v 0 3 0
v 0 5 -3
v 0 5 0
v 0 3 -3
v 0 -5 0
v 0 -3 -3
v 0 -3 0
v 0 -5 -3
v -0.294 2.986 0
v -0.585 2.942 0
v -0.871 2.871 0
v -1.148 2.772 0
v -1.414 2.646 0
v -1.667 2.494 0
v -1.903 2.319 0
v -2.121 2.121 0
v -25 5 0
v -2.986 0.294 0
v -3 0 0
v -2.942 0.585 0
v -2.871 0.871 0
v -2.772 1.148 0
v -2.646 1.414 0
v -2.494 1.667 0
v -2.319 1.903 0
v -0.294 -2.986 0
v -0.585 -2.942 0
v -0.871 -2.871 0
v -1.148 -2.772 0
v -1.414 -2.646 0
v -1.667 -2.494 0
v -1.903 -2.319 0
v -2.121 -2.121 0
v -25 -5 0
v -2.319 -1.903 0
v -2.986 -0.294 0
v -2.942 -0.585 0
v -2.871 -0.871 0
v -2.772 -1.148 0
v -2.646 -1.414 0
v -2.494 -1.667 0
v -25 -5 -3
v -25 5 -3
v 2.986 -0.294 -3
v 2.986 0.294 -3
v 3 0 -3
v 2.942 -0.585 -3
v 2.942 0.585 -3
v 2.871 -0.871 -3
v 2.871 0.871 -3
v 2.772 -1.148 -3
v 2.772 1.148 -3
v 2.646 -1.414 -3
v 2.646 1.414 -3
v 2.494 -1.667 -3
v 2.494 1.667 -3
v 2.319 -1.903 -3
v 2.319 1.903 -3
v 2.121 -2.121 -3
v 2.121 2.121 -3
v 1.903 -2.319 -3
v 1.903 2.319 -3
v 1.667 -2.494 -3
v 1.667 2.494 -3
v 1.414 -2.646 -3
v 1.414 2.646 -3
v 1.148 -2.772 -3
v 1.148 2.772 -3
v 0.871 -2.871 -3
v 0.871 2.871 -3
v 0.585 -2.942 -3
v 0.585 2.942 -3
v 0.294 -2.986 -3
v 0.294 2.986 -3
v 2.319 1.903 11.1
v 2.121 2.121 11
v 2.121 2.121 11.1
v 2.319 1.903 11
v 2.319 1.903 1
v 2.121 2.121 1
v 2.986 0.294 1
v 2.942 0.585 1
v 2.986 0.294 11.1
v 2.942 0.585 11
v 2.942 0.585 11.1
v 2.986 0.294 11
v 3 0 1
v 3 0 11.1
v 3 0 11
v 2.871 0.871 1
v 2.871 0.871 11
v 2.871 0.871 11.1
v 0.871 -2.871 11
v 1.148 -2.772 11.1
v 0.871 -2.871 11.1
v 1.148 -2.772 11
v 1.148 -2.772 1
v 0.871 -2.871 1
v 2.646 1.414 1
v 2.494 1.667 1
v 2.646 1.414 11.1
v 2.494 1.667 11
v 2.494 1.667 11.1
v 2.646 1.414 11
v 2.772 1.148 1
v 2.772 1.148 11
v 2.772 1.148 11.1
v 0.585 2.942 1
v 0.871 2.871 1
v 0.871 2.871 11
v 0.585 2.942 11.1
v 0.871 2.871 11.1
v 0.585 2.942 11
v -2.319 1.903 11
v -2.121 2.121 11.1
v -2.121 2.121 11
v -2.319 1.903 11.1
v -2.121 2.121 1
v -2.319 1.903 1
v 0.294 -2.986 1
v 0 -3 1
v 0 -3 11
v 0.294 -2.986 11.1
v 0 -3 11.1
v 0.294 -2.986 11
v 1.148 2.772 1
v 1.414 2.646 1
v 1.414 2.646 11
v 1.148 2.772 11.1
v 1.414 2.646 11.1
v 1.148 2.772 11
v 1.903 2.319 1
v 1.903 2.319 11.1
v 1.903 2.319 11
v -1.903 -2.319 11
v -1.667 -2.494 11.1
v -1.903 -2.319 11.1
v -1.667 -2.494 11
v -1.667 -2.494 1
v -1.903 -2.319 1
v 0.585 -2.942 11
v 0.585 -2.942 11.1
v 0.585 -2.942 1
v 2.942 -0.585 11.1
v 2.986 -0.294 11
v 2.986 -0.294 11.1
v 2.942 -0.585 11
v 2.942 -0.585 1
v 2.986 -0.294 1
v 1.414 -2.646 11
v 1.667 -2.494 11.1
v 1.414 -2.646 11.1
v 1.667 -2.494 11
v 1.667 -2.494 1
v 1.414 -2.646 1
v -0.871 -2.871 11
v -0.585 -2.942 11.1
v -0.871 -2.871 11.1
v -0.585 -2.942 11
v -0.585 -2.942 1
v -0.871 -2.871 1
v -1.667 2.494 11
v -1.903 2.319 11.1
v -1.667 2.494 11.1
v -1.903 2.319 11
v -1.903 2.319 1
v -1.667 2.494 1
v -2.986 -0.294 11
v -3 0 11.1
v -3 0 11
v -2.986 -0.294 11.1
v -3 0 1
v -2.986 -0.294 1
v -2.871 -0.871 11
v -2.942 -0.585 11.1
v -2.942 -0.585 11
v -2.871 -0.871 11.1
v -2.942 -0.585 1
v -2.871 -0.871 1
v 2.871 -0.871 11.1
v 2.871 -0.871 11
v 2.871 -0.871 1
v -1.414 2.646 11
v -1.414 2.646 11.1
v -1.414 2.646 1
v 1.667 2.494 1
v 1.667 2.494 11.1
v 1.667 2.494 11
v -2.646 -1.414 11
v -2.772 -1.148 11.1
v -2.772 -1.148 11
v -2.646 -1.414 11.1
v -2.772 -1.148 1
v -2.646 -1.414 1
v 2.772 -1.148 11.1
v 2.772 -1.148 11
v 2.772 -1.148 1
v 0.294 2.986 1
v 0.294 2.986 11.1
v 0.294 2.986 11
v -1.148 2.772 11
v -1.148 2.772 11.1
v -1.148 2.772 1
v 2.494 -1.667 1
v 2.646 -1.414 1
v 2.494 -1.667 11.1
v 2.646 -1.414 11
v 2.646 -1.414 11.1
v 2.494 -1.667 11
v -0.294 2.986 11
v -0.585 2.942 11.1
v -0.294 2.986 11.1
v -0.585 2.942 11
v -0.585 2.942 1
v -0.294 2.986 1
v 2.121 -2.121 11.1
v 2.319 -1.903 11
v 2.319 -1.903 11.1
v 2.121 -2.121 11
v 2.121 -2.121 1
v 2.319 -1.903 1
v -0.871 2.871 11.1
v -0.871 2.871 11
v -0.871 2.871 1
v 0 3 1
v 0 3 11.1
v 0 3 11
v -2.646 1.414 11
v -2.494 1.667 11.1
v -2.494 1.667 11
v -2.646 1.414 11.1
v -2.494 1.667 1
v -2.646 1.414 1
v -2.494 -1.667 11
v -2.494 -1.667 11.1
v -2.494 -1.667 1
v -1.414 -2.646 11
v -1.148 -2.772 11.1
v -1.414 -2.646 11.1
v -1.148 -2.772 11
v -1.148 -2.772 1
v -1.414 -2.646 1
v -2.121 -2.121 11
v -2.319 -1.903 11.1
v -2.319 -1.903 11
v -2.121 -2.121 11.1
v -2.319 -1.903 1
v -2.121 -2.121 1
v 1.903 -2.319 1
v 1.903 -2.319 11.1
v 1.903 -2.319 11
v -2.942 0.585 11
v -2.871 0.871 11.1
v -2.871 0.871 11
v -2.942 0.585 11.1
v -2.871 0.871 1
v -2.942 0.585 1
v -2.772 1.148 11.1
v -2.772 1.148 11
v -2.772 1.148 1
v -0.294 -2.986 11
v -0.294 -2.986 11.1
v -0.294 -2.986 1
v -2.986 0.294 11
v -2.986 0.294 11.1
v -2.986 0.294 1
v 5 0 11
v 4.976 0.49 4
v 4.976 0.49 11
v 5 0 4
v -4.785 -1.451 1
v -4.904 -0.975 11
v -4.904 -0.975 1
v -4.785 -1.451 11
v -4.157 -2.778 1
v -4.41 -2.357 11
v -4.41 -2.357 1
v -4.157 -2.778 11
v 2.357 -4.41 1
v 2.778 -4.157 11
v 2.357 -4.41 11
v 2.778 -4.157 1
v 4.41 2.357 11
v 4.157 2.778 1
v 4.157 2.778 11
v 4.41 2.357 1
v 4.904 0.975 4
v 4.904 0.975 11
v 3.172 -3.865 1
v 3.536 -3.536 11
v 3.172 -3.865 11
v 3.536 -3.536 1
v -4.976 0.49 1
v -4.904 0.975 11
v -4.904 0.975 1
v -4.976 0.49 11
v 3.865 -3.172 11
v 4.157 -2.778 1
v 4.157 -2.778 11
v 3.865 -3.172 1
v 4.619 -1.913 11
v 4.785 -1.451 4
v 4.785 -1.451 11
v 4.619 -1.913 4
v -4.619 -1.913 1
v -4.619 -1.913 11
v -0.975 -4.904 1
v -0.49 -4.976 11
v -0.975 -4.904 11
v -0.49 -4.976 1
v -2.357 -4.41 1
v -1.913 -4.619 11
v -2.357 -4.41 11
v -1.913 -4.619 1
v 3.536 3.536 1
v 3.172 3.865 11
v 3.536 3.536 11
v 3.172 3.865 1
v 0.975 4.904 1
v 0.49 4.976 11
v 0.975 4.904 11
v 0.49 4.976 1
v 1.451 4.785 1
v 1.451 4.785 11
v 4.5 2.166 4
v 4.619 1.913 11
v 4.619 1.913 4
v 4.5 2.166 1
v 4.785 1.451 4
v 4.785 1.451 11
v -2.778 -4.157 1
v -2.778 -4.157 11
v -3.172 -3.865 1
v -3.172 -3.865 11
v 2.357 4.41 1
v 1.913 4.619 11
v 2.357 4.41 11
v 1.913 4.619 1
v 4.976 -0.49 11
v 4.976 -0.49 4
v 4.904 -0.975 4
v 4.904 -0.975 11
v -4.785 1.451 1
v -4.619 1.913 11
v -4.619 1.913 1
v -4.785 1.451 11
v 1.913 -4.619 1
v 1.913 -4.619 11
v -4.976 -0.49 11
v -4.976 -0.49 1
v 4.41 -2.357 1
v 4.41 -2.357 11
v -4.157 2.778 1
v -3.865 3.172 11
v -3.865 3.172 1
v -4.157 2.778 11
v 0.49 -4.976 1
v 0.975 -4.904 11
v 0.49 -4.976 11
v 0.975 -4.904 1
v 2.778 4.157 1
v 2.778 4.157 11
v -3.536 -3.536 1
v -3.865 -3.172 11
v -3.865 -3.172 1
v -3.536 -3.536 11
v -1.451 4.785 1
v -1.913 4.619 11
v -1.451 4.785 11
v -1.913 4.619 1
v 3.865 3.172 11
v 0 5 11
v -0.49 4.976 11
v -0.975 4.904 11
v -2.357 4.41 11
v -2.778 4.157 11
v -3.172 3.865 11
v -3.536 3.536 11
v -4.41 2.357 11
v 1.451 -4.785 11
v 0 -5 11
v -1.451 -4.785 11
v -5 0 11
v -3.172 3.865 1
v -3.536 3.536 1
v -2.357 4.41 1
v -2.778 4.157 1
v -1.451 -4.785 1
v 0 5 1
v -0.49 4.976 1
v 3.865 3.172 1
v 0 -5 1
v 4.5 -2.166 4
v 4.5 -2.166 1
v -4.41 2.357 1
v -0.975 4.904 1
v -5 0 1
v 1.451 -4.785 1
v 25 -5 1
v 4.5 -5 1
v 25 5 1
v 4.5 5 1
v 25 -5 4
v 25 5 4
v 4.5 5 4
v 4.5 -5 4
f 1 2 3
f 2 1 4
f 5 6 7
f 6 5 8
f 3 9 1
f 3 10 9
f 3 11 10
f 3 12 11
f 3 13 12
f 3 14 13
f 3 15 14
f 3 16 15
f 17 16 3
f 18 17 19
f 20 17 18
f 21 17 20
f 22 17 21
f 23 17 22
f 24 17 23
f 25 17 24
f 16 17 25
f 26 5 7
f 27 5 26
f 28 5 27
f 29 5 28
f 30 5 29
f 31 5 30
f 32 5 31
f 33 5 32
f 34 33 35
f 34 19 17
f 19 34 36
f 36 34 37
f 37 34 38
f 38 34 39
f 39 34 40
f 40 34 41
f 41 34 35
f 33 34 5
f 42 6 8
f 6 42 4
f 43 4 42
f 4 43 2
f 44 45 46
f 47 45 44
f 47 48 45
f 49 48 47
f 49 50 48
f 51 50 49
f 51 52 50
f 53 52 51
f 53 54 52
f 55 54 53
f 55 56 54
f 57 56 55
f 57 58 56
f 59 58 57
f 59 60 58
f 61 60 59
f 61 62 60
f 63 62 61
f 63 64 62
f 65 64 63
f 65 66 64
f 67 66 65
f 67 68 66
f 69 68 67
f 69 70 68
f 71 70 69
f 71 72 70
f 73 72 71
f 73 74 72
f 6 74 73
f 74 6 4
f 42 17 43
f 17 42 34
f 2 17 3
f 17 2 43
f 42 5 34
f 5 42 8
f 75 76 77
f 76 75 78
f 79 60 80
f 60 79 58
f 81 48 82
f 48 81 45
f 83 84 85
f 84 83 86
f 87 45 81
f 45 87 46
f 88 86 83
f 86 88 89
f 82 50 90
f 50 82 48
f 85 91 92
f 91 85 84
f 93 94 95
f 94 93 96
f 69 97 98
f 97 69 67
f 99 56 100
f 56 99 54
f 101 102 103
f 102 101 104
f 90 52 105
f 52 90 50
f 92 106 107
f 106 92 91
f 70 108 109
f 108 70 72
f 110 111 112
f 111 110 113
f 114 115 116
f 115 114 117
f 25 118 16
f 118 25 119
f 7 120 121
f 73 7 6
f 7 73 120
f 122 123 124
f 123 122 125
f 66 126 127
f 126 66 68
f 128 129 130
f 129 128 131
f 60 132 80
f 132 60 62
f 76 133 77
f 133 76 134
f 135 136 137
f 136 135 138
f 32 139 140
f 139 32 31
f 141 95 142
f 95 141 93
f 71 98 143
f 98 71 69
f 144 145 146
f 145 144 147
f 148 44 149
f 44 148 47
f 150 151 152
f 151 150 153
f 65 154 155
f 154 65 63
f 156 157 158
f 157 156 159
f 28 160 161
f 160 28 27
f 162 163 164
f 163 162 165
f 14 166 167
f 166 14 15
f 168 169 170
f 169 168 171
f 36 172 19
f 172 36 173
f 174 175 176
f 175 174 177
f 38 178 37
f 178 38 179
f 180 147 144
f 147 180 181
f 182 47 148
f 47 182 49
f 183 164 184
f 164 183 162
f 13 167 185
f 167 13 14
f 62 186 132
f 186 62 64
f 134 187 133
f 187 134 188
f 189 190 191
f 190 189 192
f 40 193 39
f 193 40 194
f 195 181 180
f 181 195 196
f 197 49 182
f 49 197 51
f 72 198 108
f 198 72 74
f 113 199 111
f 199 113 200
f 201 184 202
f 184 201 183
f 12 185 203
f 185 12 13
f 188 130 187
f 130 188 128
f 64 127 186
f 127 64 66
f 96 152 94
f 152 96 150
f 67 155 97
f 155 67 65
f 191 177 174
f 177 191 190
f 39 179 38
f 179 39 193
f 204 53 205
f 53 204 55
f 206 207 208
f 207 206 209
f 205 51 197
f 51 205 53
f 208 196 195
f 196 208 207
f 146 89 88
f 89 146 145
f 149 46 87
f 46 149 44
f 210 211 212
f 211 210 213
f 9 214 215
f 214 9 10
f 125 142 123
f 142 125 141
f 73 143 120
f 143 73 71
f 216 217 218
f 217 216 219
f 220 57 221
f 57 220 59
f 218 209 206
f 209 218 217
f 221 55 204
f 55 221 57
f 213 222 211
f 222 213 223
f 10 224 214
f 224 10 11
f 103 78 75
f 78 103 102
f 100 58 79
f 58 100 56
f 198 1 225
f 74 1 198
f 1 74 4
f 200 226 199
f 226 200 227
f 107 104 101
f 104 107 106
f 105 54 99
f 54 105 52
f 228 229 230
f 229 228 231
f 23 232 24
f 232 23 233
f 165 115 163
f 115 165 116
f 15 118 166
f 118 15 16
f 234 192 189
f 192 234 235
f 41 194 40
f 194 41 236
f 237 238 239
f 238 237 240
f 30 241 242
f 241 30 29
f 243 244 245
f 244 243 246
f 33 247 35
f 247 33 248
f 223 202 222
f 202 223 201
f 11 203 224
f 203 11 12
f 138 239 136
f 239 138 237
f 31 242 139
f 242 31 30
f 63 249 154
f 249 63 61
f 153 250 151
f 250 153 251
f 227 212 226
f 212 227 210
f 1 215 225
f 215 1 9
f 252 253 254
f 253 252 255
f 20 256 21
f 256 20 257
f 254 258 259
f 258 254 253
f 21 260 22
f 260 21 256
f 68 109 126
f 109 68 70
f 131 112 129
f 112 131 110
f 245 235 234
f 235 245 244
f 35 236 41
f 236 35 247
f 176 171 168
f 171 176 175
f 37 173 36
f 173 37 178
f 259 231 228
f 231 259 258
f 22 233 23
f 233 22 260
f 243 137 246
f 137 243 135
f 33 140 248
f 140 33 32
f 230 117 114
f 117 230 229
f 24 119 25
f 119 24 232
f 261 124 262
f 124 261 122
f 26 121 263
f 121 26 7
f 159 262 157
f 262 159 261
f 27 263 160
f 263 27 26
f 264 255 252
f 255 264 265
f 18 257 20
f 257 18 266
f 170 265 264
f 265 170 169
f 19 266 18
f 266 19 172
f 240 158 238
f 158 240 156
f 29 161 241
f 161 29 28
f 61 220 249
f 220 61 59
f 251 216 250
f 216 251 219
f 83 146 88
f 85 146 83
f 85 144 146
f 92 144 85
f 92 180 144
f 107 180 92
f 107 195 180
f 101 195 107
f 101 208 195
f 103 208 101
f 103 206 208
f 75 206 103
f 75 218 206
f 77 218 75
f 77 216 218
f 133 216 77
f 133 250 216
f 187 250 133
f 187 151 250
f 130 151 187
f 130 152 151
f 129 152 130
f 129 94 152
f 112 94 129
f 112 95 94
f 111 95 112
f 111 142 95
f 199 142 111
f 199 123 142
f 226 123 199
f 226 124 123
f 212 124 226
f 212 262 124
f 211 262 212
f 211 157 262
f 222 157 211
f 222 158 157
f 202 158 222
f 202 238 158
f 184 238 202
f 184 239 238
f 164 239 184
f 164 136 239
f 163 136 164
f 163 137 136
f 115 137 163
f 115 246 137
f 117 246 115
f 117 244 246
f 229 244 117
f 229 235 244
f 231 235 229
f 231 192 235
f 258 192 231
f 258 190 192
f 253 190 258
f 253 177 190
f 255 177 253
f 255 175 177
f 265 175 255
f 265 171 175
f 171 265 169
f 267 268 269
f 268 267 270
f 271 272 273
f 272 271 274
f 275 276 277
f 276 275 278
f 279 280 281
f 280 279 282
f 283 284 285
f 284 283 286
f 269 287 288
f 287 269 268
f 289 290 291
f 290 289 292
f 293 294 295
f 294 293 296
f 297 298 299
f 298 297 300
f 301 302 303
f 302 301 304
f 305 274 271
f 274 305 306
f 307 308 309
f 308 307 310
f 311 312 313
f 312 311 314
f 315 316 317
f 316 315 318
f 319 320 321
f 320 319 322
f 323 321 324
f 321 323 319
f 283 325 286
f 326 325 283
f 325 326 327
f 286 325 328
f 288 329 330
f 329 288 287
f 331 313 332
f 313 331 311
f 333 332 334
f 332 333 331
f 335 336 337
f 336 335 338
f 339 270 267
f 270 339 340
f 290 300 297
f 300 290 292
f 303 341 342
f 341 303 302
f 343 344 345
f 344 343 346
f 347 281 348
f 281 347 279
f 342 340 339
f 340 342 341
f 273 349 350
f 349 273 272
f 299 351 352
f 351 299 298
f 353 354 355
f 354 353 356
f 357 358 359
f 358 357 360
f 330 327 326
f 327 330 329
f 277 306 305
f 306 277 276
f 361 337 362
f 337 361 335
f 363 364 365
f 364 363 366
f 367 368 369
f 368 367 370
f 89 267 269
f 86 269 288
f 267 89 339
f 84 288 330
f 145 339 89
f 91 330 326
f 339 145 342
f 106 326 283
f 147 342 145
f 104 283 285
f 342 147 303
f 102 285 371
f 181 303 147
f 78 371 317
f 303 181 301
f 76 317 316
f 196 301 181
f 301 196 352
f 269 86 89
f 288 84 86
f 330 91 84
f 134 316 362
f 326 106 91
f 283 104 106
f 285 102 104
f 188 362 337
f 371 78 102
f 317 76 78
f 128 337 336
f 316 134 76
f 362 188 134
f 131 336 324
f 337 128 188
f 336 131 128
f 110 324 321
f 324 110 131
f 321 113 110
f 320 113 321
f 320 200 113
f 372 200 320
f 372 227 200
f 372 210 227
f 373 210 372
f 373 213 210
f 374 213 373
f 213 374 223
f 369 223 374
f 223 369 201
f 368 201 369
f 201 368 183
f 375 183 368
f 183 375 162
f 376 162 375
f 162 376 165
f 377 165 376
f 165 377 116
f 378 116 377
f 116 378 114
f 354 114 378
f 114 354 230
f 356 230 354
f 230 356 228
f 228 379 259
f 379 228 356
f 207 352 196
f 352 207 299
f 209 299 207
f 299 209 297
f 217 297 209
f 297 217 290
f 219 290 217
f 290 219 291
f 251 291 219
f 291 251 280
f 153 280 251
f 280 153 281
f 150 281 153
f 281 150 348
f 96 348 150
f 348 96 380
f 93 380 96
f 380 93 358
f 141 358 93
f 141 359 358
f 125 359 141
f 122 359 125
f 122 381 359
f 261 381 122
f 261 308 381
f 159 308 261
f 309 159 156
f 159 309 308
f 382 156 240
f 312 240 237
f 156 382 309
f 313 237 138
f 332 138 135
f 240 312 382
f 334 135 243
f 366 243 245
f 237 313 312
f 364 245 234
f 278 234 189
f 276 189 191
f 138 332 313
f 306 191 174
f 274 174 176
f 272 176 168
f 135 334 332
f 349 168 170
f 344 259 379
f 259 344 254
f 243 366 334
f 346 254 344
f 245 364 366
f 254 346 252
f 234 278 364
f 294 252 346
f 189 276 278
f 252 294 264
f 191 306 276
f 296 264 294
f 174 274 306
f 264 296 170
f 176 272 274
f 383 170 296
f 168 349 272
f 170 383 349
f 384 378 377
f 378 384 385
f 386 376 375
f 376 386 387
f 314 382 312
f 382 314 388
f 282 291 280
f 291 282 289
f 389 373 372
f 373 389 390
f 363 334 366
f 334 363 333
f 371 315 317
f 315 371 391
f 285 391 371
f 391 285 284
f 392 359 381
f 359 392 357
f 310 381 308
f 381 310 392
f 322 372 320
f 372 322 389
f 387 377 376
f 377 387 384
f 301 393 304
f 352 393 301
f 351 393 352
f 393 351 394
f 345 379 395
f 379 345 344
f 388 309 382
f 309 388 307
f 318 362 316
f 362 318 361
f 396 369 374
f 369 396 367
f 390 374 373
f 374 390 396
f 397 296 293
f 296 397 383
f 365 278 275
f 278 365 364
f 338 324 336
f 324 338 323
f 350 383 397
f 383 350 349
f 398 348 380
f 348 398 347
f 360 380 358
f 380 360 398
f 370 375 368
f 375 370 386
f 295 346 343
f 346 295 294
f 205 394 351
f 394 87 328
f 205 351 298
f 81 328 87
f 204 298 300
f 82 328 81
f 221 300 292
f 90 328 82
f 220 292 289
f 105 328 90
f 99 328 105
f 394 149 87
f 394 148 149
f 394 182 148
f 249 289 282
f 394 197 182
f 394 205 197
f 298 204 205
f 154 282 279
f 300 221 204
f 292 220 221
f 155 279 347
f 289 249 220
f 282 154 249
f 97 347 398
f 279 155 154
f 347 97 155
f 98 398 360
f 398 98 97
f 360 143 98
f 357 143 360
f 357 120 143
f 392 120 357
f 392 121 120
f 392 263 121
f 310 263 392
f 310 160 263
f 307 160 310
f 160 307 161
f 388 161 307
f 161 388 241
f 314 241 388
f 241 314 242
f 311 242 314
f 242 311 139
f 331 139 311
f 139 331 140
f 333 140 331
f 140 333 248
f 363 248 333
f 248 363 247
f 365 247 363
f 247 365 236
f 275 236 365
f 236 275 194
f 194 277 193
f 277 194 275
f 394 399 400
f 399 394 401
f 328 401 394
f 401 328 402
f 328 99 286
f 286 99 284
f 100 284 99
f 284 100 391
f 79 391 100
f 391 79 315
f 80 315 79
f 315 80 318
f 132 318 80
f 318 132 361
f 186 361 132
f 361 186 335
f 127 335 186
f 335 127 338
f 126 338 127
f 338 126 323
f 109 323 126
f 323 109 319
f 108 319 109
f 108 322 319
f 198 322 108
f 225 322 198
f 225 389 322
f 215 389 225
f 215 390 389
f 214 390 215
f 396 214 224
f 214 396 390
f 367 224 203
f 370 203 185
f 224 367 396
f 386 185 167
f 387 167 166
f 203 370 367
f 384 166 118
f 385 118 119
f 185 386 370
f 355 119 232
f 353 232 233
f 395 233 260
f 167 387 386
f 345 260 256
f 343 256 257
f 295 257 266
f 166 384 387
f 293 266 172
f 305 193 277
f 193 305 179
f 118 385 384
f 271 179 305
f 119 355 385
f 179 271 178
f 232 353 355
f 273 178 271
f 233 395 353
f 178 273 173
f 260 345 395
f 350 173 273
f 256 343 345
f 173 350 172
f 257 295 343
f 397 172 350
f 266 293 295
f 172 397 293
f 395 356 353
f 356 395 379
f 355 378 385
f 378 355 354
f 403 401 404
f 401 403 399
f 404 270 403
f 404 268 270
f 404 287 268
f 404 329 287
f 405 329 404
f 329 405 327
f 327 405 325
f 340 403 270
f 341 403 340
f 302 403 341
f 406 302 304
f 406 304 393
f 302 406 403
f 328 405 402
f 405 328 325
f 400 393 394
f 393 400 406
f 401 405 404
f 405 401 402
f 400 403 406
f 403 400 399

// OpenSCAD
// Adversarial: two genuinely distinct parts, but the moving part has no bore.
// The pin is embedded in solid material, so the fit and the motion must both
// fail even though the part count is right.
agentscad_part = "all";
$fn = 64;

module fixed_leaf() {
  union() {
    translate([-25, -5, -3]) cube([25, 10, 3]);
    translate([0, 0, -3]) cylinder(h = 14.1, d = 6);
  }
}

module moving_leaf() {
  union() {
    translate([0, 0, 1]) cylinder(h = 10, d = 10);
    translate([4.5, -5, 1]) cube([20.5, 10, 3]);
  }
}

module generated_part() {
  if (agentscad_part == "all" || agentscad_part == "fixed") fixed_leaf();
  if (agentscad_part == "all" || agentscad_part == "moving") moving_leaf();
}

generated_part();
